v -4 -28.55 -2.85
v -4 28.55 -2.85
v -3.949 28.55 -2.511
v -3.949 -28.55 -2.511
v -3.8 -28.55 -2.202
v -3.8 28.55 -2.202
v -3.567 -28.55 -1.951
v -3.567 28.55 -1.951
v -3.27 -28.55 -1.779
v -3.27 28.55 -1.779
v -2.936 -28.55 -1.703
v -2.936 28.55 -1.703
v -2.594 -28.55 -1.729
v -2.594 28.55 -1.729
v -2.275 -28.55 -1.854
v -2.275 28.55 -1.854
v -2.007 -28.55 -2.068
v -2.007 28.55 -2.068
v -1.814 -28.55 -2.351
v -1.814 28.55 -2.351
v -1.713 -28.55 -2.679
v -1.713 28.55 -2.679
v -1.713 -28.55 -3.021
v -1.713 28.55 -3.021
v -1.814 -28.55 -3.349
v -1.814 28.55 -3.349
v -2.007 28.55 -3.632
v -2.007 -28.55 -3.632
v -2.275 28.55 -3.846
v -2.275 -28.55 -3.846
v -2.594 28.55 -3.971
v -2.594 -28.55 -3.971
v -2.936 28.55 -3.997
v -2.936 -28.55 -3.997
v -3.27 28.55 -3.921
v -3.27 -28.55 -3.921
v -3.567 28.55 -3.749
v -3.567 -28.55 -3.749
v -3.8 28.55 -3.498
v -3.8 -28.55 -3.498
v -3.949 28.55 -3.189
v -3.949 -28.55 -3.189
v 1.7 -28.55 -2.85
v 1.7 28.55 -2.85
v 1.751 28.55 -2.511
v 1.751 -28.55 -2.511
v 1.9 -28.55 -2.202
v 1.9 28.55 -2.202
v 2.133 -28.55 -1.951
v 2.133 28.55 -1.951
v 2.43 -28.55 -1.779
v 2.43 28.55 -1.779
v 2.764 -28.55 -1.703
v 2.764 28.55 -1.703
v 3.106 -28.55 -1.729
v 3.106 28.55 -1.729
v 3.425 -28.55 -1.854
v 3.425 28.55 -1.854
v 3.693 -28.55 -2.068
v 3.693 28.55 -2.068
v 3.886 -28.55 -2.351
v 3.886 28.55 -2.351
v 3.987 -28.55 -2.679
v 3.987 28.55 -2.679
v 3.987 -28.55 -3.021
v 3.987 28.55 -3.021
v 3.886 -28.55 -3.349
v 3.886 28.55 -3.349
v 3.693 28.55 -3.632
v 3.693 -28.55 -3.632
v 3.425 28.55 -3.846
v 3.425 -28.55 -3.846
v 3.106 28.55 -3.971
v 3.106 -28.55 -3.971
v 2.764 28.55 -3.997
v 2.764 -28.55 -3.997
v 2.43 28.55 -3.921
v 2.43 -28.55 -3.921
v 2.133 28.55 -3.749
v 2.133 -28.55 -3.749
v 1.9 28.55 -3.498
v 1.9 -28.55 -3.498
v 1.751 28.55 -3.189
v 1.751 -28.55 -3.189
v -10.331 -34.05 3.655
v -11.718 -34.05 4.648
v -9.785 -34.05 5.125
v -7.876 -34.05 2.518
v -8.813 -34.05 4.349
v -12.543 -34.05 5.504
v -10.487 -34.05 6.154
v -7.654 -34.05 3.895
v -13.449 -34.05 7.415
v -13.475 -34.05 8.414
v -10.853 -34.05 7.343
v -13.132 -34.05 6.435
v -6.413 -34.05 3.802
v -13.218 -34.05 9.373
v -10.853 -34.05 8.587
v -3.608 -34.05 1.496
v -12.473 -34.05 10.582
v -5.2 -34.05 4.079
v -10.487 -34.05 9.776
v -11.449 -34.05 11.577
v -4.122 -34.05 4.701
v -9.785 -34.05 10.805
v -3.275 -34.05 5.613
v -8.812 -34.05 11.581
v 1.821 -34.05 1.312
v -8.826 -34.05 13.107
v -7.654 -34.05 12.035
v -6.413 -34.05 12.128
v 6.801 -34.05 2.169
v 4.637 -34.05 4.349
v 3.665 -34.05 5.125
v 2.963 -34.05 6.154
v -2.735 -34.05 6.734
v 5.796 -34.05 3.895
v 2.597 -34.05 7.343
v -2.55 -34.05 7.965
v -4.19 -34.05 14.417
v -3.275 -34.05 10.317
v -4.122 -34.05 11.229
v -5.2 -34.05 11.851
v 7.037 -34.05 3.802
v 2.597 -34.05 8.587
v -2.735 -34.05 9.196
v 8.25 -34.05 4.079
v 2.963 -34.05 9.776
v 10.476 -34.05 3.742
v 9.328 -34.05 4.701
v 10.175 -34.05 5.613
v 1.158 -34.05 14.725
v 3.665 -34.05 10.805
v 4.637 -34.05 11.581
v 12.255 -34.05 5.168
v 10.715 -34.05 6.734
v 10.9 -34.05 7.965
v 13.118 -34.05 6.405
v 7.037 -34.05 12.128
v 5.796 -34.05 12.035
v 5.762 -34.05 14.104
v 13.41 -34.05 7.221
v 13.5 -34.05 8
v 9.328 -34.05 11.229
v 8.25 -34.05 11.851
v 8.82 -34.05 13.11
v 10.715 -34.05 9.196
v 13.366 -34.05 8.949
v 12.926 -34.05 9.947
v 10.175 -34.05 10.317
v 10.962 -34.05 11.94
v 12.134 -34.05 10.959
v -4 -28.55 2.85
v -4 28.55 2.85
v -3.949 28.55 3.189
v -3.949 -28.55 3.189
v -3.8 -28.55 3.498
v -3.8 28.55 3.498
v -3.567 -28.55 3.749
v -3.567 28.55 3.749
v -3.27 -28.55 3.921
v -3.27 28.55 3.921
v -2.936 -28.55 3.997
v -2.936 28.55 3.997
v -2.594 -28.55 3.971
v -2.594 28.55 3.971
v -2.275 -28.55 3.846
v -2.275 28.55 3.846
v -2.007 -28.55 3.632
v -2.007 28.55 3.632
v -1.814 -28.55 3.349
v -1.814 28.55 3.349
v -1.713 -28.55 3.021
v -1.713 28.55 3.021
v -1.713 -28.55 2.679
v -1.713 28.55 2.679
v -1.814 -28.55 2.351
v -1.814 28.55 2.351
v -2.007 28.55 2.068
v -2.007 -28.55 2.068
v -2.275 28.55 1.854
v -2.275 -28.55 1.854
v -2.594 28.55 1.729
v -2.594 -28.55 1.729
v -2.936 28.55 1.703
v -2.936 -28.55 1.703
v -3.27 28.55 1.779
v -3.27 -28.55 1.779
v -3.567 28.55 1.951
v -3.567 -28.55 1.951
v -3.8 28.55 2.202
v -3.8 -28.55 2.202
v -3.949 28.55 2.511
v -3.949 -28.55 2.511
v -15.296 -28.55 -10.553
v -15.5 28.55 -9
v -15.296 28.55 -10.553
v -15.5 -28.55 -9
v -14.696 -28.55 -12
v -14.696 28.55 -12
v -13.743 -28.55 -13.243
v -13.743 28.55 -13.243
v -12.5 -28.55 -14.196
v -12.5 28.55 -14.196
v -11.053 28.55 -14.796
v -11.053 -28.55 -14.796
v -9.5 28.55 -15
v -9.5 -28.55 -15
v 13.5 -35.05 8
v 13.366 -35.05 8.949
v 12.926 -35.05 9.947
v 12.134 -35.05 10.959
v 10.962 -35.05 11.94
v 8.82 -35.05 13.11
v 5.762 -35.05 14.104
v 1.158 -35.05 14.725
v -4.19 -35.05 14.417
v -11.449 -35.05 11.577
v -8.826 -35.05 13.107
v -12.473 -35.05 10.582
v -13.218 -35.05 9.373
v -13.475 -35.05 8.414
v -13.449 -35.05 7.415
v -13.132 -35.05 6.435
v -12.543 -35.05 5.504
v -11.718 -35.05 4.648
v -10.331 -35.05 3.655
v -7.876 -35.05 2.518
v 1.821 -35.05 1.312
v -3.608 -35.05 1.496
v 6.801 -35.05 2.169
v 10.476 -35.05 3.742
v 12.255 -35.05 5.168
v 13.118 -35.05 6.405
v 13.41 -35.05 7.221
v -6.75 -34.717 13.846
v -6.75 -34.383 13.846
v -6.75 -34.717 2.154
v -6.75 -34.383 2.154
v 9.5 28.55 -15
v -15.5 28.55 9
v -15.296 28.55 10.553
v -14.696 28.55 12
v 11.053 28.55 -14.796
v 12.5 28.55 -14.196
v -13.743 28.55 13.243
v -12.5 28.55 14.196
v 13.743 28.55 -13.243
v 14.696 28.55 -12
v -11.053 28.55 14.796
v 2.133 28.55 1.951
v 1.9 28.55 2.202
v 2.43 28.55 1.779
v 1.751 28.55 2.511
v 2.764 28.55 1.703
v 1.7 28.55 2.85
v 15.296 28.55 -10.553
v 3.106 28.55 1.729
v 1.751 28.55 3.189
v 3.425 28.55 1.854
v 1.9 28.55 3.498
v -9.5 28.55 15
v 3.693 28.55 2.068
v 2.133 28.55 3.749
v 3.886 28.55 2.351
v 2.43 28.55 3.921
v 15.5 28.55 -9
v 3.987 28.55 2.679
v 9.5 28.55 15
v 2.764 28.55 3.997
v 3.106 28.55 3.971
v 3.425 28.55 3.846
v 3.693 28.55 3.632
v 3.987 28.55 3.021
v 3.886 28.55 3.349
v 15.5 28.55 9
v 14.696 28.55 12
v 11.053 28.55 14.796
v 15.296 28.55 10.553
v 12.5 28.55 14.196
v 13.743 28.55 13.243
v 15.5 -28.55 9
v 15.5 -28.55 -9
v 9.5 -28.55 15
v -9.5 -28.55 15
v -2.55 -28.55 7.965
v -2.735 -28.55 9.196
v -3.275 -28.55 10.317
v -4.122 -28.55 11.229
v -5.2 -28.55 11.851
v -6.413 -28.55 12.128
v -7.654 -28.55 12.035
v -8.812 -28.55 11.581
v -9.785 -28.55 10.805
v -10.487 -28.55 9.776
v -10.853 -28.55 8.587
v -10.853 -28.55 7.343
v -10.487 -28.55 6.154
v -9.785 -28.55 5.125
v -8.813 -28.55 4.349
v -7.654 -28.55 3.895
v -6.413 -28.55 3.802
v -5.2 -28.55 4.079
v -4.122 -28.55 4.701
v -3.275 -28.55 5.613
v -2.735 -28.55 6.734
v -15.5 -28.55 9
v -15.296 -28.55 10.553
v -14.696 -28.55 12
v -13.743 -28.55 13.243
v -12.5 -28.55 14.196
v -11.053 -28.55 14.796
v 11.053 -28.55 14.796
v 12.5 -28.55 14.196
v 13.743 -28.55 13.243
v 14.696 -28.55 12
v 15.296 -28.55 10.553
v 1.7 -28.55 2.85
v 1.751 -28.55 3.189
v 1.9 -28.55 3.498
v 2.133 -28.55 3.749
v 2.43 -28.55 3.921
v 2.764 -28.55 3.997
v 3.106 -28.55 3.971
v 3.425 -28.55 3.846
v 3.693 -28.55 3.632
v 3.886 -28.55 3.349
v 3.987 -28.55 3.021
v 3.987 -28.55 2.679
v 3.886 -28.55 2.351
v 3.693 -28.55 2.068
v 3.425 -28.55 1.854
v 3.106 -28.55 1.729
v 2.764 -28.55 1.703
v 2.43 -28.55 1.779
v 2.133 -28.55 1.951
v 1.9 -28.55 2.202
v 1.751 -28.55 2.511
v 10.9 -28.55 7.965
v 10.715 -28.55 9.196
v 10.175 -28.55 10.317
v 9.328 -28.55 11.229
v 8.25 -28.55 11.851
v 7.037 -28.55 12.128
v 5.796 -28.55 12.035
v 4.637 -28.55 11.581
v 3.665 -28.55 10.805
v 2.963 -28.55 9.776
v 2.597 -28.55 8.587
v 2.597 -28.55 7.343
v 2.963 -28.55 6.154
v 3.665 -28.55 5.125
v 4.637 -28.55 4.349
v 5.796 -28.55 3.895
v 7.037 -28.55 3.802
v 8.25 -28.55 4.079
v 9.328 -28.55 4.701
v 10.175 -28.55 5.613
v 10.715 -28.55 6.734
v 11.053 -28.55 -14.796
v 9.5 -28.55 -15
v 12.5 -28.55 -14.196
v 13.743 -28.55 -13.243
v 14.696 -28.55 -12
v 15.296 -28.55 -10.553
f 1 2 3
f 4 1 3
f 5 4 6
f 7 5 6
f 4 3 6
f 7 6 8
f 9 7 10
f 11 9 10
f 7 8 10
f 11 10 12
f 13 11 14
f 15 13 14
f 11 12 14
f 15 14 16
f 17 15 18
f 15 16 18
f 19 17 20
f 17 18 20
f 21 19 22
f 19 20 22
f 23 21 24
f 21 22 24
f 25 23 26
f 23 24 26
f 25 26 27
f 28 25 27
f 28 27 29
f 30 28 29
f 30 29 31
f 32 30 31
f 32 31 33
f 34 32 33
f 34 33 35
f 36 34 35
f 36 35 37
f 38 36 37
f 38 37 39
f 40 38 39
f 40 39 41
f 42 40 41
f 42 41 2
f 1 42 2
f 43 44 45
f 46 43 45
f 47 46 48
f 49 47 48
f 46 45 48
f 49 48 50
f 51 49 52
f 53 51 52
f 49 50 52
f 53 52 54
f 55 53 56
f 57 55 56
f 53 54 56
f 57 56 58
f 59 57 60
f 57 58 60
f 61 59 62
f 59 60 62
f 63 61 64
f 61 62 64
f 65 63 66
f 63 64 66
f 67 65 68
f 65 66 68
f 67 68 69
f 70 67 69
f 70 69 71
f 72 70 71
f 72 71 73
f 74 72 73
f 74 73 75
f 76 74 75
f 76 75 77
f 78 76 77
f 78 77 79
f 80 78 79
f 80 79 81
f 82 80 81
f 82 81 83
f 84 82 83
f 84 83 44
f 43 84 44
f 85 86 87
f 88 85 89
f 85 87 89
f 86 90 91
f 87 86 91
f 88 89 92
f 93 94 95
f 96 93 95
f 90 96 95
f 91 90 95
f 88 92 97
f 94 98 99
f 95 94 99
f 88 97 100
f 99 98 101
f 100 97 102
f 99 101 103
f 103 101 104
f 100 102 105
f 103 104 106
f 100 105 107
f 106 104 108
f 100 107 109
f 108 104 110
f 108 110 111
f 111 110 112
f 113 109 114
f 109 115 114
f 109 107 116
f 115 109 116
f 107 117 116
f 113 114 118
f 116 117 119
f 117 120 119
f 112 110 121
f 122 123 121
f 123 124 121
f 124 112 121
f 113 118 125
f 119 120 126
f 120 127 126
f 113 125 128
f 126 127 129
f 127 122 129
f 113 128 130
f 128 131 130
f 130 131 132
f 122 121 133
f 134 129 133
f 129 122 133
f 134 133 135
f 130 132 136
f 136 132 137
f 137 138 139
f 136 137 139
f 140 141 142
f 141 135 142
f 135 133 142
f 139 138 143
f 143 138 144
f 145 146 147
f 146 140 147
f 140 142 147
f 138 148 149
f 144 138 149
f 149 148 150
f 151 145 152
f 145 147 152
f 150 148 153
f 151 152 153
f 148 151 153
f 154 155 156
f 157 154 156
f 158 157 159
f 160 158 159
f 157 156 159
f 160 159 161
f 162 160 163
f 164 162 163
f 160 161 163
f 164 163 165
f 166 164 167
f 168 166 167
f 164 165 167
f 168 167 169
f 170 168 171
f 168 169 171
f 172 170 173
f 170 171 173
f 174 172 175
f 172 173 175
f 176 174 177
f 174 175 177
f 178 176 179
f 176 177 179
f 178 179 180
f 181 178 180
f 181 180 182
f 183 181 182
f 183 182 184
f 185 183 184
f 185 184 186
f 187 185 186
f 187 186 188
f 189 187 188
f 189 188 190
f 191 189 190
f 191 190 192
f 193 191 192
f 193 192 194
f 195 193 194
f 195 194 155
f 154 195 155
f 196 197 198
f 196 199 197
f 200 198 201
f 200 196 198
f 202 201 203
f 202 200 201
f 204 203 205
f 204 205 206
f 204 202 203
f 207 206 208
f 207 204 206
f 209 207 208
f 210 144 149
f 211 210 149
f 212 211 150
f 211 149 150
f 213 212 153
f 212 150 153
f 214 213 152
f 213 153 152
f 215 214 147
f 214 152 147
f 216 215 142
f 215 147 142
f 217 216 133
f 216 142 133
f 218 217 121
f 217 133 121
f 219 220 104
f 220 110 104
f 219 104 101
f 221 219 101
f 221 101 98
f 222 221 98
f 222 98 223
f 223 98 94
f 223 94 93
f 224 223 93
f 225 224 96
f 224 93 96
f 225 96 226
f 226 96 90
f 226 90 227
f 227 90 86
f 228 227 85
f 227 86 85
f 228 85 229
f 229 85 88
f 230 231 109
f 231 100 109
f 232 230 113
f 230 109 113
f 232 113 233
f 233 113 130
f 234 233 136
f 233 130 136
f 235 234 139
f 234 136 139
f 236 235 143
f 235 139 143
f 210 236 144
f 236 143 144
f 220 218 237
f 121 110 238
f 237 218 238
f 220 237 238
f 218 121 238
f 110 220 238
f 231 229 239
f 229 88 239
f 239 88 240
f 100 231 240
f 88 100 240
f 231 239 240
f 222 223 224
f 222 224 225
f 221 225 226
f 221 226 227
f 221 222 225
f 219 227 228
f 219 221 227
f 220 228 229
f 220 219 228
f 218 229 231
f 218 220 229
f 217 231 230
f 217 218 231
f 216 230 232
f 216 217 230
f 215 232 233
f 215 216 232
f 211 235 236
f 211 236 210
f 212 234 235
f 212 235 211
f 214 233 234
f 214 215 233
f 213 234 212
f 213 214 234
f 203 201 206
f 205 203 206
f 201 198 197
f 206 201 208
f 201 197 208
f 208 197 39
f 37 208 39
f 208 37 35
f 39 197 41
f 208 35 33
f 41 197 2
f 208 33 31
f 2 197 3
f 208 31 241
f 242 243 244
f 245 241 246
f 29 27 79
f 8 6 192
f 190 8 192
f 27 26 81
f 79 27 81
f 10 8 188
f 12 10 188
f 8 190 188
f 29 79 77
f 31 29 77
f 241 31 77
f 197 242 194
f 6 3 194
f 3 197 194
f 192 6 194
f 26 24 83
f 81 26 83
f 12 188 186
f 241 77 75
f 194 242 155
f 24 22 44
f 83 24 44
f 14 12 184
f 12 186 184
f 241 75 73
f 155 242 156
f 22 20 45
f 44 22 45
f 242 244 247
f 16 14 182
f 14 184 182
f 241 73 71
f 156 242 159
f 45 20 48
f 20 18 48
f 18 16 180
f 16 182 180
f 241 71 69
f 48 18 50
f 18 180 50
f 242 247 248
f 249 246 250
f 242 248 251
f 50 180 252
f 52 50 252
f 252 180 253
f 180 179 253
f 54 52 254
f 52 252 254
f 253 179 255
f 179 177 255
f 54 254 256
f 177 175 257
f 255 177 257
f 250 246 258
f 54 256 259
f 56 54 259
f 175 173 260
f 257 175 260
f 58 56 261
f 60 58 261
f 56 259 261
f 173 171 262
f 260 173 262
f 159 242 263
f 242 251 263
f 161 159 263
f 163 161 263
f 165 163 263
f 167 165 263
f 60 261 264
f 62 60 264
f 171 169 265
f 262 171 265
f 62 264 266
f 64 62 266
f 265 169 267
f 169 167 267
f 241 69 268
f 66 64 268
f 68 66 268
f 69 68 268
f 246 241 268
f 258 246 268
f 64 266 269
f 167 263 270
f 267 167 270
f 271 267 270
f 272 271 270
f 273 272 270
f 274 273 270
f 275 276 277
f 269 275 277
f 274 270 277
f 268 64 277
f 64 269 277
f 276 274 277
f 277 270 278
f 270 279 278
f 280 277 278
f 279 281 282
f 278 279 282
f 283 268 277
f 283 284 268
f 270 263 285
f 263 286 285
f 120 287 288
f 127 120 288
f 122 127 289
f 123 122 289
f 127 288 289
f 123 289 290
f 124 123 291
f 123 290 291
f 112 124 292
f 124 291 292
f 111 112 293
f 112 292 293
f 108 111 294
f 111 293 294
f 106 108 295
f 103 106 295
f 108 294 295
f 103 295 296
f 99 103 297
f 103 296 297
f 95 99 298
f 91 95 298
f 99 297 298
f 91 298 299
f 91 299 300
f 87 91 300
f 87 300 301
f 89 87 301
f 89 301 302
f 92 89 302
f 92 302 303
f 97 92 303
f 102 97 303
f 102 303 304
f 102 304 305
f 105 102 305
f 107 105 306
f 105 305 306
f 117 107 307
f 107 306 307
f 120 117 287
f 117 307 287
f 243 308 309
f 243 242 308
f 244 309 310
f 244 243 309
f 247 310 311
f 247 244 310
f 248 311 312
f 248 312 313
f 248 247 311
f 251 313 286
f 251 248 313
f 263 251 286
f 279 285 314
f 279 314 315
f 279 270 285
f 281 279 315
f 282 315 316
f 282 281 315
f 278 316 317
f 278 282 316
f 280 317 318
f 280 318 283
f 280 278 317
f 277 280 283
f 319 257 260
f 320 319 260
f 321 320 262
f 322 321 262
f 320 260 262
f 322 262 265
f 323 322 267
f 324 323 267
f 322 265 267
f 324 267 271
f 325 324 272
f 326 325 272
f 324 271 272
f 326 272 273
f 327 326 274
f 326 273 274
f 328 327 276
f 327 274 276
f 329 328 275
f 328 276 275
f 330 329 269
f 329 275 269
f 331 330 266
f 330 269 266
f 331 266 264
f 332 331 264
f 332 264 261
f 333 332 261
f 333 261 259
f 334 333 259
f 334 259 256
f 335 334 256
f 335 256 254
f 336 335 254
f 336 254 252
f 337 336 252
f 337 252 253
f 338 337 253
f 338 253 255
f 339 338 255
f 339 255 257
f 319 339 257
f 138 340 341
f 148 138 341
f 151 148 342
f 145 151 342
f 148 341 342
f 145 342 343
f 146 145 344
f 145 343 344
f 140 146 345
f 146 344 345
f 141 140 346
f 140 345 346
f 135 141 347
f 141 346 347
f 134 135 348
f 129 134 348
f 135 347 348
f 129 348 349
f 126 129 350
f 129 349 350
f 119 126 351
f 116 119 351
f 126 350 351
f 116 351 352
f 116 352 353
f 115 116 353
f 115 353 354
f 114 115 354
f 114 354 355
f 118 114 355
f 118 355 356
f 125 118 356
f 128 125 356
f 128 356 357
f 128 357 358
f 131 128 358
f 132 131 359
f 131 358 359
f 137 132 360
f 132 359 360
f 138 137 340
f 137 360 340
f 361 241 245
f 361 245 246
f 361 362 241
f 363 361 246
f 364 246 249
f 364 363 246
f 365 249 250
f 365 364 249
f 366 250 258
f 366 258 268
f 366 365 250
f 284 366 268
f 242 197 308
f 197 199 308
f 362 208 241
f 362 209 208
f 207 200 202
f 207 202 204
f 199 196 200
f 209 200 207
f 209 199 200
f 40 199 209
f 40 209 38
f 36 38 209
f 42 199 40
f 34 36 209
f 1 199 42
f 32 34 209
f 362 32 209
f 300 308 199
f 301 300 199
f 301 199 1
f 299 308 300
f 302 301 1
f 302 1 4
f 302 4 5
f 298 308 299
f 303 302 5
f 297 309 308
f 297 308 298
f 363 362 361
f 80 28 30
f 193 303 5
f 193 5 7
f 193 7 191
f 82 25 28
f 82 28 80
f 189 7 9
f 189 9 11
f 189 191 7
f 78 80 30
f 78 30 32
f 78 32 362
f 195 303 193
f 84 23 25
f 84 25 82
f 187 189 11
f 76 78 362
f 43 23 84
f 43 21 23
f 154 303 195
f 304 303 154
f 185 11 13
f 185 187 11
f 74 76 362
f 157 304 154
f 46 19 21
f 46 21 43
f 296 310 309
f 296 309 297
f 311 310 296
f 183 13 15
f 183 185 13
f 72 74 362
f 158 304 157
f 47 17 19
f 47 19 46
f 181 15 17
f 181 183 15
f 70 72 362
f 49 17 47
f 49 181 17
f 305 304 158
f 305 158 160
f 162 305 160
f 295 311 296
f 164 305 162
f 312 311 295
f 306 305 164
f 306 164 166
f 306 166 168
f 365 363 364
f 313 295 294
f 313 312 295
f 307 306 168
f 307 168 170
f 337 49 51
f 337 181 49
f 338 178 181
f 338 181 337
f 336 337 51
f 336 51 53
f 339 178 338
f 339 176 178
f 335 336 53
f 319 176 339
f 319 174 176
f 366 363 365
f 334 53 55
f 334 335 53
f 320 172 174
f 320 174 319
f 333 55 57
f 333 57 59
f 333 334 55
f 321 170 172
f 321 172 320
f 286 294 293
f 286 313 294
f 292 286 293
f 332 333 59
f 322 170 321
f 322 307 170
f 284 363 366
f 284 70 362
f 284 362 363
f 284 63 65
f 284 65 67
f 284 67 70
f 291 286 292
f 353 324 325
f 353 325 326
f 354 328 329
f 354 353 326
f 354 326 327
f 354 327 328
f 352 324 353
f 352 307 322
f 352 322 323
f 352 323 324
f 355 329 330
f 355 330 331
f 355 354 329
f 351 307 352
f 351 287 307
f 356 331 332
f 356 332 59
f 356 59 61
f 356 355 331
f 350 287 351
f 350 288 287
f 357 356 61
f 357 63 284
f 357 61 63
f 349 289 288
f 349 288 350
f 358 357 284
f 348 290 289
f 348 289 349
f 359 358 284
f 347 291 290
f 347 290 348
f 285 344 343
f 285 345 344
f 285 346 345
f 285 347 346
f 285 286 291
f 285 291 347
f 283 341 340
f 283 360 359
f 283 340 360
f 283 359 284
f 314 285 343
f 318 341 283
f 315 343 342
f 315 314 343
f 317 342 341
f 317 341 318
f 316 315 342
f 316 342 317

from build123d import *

# Parameters (mm, degrees)
F0_W     = 31
F0_H     = 30
F1_DEPTH = 28.55
F2_R     = 1.15
F3_DEPTH = 57.101
F4_R     = 4.175
F5_DEPTH = 5.5
F7_DEPTH = 1
F8_R     = 6


with BuildPart() as f1:
    # F0 (on Front) → F1 (new body, symmetric)
    with BuildSketch(Plane.XZ):
        Rectangle(F0_W, F0_H)
    extrude(amount=F1_DEPTH, both=True)

    # F2 (on face) → F3 (cut, through all)
    with BuildSketch(Plane(origin=(0, 28.55, 0), x_dir=(-1, 0, 0), z_dir=(0, 1, 0))):
        with Locations((-2.85, 2.85)):
            Circle(F2_R)
        with Locations((2.85, 2.85)):
            Circle(F2_R)
        with Locations((-2.85, -2.85)):
            Circle(F2_R)
        with Locations((2.85, -2.85)):
            Circle(F2_R)
    extrude(amount=-F3_DEPTH, mode=Mode.SUBTRACT)

    # F4 (on face) → F5 (join)
    with BuildSketch(Plane.XZ.offset(28.55)):
        with Locations((6.725, 7.965)):
            Circle(F4_R)
        with Locations((-6.725, 7.965)):
            Circle(F4_R)
    extrude(amount=F5_DEPTH)

    # F6 (on face) → F7 (join)
    with BuildSketch(Plane.XZ.offset(34.05)):
        with BuildLine():
            add(Edge.make_bspline(
                [(13.5, 8), (13.5, 19.691343), (-6.75, 13.845671), (-27, 8), (-6.75, 2.154329), (13.5, -3.691343), (13.5, 8)],
                knots=[0, 0, 0, 2.094395, 2.094395, 4.18879, 4.18879, 6.283185, 6.283185, 6.283185], degree=2, weights=[1, 0.5, 1, 0.5, 1, 0.5, 1]))
        make_face()
    extrude(amount=F7_DEPTH)

    # F8
    f8_edges = [f1.edges().sort_by_distance(p)[0] for p in [
        (-15.5, 0, 15),
        (15.5, 0, 15),
        (-15.5, 0, -15),
        (15.5, 0, -15),
    ]]
    fillet(f8_edges, radius=F8_R)


solid = f1.part
